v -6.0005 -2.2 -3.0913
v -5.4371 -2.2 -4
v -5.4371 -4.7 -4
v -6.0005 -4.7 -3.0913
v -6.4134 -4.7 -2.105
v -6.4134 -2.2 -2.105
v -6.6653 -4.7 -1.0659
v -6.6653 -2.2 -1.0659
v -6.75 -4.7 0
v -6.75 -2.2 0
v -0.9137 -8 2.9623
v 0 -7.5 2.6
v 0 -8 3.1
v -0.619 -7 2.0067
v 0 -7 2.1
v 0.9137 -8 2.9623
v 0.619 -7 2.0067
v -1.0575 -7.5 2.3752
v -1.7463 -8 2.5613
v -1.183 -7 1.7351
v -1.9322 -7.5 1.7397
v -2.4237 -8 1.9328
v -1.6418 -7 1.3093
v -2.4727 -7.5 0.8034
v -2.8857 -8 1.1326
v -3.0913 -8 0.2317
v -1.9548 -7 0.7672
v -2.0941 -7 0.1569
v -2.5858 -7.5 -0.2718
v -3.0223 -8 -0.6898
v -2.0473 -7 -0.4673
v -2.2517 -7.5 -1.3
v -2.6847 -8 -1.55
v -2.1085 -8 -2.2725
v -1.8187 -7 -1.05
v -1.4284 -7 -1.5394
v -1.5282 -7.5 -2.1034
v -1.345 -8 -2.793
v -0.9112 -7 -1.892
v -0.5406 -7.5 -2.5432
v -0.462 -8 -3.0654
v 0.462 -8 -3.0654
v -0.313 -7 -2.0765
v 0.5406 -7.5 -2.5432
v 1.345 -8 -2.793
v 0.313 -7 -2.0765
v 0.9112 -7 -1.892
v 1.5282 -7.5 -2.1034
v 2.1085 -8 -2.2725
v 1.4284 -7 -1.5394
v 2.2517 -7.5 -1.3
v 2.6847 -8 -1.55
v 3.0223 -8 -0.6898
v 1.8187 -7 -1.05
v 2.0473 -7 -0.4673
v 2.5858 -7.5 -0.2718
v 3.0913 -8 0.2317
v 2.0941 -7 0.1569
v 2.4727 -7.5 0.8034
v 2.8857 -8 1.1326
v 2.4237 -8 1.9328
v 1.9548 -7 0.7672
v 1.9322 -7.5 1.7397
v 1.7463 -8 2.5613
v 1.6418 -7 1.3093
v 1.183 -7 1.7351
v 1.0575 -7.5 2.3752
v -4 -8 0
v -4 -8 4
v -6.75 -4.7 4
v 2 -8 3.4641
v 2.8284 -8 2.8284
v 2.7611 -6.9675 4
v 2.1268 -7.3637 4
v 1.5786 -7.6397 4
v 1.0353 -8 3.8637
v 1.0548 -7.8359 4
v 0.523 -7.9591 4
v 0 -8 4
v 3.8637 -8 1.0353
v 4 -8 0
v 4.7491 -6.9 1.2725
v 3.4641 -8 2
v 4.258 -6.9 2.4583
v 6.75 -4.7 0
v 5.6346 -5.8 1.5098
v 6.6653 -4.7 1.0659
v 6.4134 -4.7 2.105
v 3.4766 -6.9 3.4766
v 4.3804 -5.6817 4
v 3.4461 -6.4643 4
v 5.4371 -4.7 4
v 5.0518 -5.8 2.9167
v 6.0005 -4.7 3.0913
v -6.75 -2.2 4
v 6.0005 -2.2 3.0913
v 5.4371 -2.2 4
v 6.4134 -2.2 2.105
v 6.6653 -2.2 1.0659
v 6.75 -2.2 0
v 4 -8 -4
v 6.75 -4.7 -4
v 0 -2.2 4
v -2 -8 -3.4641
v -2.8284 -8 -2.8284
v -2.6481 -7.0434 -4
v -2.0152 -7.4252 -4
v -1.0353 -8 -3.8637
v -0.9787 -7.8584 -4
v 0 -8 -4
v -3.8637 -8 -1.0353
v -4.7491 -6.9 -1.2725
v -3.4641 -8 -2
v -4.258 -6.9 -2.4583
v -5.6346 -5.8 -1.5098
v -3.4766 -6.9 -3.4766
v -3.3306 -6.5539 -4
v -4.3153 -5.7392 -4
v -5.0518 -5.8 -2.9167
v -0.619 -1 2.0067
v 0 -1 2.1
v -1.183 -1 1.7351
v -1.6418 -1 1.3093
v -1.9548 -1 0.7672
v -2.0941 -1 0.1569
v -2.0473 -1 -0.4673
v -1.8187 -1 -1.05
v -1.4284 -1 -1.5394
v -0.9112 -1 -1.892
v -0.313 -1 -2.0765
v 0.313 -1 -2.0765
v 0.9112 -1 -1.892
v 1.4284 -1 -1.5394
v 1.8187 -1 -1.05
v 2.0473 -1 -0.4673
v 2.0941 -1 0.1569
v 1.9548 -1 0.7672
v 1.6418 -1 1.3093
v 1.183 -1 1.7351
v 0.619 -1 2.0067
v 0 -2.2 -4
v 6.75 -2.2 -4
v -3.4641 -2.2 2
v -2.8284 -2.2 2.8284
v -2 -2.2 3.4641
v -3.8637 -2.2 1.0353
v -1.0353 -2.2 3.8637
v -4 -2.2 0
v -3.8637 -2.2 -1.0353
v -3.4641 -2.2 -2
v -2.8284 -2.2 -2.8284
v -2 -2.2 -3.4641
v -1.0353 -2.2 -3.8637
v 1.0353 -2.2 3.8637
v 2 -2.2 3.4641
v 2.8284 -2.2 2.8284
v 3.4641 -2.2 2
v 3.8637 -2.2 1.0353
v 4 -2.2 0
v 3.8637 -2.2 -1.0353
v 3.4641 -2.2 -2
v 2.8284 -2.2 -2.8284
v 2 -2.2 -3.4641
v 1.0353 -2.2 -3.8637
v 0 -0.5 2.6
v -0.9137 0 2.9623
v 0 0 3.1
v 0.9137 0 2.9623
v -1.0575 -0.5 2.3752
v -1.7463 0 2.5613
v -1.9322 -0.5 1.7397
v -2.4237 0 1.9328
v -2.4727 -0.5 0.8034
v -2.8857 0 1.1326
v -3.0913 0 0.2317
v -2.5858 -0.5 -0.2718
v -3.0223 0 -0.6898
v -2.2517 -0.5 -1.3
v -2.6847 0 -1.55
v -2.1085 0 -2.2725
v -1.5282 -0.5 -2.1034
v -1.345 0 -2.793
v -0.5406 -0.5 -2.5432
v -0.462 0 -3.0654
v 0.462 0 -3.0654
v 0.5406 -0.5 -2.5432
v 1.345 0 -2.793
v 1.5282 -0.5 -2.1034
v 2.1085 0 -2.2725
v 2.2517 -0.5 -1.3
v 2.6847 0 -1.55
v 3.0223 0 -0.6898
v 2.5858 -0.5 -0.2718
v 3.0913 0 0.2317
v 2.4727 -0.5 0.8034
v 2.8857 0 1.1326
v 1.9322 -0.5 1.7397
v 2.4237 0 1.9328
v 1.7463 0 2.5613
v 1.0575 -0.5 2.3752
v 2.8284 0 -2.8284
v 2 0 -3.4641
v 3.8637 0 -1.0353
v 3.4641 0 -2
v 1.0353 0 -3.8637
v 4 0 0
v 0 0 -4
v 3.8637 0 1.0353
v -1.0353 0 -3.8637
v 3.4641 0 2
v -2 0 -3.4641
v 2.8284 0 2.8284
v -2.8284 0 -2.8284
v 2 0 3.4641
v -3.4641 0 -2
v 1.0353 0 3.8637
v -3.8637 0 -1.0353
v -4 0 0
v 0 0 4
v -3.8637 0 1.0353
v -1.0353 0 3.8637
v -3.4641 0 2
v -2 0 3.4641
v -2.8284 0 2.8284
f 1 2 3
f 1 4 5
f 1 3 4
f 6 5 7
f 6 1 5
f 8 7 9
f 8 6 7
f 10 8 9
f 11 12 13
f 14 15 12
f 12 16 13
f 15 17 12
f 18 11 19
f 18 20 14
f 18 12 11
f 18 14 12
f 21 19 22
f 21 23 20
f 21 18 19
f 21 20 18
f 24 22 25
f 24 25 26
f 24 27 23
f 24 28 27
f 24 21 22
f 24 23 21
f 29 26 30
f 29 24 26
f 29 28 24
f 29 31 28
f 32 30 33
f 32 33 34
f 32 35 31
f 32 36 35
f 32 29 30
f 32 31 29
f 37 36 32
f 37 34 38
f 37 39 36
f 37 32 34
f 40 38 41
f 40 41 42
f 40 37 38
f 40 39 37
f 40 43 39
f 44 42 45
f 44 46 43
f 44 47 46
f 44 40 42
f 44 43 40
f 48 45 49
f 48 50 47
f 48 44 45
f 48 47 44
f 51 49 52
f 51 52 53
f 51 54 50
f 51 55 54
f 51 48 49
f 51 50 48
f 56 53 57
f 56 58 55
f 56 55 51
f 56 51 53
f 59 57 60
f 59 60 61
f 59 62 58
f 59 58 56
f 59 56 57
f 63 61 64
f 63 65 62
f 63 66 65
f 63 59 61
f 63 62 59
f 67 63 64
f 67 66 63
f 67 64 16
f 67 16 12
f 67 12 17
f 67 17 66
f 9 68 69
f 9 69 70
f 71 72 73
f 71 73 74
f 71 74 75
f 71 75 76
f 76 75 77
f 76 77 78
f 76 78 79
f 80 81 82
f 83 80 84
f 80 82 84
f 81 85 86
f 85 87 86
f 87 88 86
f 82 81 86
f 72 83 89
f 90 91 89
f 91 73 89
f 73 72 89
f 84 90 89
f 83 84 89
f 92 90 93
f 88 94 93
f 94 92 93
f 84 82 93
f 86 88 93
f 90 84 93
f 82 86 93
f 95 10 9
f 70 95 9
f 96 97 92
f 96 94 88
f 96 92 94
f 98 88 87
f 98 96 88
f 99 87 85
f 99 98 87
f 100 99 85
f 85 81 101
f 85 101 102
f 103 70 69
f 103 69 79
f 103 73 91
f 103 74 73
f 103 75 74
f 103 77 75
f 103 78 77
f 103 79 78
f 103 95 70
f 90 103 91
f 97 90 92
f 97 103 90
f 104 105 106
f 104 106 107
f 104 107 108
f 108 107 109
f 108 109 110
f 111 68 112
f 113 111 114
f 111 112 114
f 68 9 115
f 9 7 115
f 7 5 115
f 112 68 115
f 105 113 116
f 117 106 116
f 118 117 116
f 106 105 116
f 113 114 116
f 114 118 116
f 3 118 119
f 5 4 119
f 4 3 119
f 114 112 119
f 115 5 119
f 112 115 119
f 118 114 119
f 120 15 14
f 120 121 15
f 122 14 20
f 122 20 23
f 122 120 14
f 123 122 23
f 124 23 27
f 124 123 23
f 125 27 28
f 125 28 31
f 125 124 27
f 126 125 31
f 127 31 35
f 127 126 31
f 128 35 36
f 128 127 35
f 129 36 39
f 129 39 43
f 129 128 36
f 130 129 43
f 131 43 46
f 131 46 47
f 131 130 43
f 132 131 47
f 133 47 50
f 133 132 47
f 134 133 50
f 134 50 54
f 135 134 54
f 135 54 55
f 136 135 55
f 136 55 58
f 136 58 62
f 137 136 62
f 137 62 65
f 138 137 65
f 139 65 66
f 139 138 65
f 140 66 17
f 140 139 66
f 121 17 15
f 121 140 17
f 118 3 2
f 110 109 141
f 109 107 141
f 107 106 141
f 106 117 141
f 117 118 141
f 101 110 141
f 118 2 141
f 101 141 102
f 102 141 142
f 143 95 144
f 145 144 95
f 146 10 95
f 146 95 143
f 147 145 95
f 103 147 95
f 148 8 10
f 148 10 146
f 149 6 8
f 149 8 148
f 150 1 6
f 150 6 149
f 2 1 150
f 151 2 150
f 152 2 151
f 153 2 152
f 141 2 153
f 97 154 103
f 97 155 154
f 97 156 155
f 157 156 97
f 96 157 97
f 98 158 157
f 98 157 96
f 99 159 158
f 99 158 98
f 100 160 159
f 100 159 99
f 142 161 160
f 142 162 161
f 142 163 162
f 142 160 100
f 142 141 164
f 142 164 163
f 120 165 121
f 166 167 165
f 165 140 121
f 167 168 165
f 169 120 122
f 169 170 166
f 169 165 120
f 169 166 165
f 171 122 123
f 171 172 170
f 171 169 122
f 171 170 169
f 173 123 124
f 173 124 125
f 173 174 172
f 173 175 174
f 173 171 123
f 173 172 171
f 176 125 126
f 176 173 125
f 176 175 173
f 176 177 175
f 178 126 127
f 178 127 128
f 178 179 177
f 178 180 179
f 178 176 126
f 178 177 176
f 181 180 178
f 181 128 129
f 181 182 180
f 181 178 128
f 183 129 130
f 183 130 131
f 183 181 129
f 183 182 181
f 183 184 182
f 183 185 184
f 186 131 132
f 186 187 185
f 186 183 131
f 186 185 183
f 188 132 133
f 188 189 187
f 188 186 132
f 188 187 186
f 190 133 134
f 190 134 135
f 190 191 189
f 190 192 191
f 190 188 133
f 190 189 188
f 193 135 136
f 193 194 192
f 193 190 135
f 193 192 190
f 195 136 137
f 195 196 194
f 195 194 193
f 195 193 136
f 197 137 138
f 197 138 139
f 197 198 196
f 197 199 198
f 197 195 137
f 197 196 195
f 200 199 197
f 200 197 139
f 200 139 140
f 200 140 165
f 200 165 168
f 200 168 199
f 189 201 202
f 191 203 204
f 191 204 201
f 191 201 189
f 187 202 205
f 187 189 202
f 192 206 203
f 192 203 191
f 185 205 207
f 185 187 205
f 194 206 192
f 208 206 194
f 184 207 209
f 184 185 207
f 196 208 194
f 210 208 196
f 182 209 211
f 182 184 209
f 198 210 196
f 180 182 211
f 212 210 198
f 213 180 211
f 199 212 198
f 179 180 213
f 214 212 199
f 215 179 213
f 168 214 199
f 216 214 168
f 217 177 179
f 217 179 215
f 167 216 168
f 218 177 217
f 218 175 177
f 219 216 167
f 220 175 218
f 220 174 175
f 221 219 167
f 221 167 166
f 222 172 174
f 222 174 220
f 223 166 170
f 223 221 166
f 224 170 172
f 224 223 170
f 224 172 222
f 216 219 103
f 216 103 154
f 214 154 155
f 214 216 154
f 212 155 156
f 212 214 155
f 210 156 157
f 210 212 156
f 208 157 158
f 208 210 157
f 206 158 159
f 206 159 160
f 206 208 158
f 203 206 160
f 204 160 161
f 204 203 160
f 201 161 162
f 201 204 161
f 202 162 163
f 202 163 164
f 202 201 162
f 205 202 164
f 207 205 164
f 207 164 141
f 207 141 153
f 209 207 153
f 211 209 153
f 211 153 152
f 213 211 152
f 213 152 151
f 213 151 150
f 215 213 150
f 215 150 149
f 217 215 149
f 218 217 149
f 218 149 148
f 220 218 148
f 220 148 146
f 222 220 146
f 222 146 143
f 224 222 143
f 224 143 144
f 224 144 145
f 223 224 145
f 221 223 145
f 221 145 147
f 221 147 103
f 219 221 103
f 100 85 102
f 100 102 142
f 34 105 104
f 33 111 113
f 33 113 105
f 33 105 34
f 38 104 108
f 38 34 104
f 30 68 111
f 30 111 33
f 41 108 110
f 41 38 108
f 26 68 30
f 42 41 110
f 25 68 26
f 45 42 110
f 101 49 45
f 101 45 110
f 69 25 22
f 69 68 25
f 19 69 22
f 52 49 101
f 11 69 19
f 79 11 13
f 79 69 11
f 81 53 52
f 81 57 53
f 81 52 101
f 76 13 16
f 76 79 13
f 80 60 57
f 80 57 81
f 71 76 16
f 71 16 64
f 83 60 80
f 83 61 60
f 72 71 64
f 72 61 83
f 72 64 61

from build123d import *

# Parameters (mm, degrees)
EXTRUDE_1_DEPTH     = 4
SKETCH_4_OUTSIDE_W  = 19.022
SKETCH_4_OUTSIDE_H  = 13.522
SKETCH_4_OUTSIDE_R  = 4
CUT_EXTRUDE_1_DEPTH = 2.2
CUT_EXTRUDE_2_DEPTH = 6.8


with BuildPart() as part:
    # Эскиз1 → Бобышка-Вытянуть1 (new body, symmetric)
    with BuildSketch(Plane.XY):
        Polygon((4, 0), (-4, 0), (-4, -2.2), (-6.75, -2.2), (-6.75, -8), (6.75, -8), (6.75, -2.2), (4, -2.2), align=None)
    extrude(amount=EXTRUDE_1_DEPTH, both=True)

    # Эскиз3 → Отверстие обработанное метчиком M51 (revolve, cut)
    with BuildSketch(Plane(origin=(0, 0, 0), x_dir=(0, 0, 1), z_dir=(1, 0, 0))):
        Polygon((0, 0), (0, 8), (3.1, 8), (2.1, 7), (2.1, 1), (3.1, 0), align=None)
    revolve(axis=Axis((0, 6.35, 0), (0, -1, 0)), mode=Mode.SUBTRACT)

    # Эскиз4 outside → Вырез-Вытянуть1 (cut)
    with BuildSketch(Plane(origin=(0, 0, 0), x_dir=(1, 0, 0), z_dir=(0, 1, 0))):
        Rectangle(SKETCH_4_OUTSIDE_W, SKETCH_4_OUTSIDE_H)
        with Locations(Location((0, 0, 0), (0, 0, 270))):  # turned: the seam where the file's is
            Circle(SKETCH_4_OUTSIDE_R, mode=Mode.SUBTRACT)
    extrude(amount=-CUT_EXTRUDE_1_DEPTH, mode=Mode.SUBTRACT)

    # Эскиз5 → Вырез-Вытянуть2 (cut, through all)
    with BuildSketch(Plane(origin=(0, -2.2, 0), x_dir=(1, 0, 0), z_dir=(0, 1, 0))):
        with BuildLine():
            Line((-6.75, 0), (-6.75, 4))
            Line((-6.75, 4), (-5.437140793, 4))
            ThreePointArc((-5.437140793, 4), (-6.413392252, 2.104970267), (-6.75, 0))
        make_face()
        with BuildLine():
            Line((6.75, 0), (6.75, -4))
            Line((6.75, -4), (5.437140793, -4))
            ThreePointArc((5.437140793, -4), (6.413392252, -2.104970267), (6.75, 0))
        make_face()
    extrude(amount=-CUT_EXTRUDE_2_DEPTH, mode=Mode.SUBTRACT)

    # Вырез-По траектории1: sweep along a path in Эскиз7
    with BuildLine(Plane.XZ.offset(8)) as sweep_1_path:
        Line((0, 6.75), (-6.75, 6.75))
        Line((-6.75, 6.75), (-6.75, 0))
        ThreePointArc((-6.75, 0), (-4.772970773, -4.772970773), (0, -6.75))
        Line((0, -6.75), (6.75, -6.75))
        Line((6.75, -6.75), (6.75, 0))
        ThreePointArc((6.75, 0), (4.772970773, 4.772970773), (0, 6.75))
    # Эскиз6 → Вырез-По траектории1 (sweep, cut)
    with BuildSketch(Plane.XY.offset(4)):
        Polygon((-6.75, -4.7), (-6.75, -8), (-4, -8), align=None)
    sweep(path=sweep_1_path.line, transition=Transition.RIGHT, mode=Mode.SUBTRACT)


solid = part.part
